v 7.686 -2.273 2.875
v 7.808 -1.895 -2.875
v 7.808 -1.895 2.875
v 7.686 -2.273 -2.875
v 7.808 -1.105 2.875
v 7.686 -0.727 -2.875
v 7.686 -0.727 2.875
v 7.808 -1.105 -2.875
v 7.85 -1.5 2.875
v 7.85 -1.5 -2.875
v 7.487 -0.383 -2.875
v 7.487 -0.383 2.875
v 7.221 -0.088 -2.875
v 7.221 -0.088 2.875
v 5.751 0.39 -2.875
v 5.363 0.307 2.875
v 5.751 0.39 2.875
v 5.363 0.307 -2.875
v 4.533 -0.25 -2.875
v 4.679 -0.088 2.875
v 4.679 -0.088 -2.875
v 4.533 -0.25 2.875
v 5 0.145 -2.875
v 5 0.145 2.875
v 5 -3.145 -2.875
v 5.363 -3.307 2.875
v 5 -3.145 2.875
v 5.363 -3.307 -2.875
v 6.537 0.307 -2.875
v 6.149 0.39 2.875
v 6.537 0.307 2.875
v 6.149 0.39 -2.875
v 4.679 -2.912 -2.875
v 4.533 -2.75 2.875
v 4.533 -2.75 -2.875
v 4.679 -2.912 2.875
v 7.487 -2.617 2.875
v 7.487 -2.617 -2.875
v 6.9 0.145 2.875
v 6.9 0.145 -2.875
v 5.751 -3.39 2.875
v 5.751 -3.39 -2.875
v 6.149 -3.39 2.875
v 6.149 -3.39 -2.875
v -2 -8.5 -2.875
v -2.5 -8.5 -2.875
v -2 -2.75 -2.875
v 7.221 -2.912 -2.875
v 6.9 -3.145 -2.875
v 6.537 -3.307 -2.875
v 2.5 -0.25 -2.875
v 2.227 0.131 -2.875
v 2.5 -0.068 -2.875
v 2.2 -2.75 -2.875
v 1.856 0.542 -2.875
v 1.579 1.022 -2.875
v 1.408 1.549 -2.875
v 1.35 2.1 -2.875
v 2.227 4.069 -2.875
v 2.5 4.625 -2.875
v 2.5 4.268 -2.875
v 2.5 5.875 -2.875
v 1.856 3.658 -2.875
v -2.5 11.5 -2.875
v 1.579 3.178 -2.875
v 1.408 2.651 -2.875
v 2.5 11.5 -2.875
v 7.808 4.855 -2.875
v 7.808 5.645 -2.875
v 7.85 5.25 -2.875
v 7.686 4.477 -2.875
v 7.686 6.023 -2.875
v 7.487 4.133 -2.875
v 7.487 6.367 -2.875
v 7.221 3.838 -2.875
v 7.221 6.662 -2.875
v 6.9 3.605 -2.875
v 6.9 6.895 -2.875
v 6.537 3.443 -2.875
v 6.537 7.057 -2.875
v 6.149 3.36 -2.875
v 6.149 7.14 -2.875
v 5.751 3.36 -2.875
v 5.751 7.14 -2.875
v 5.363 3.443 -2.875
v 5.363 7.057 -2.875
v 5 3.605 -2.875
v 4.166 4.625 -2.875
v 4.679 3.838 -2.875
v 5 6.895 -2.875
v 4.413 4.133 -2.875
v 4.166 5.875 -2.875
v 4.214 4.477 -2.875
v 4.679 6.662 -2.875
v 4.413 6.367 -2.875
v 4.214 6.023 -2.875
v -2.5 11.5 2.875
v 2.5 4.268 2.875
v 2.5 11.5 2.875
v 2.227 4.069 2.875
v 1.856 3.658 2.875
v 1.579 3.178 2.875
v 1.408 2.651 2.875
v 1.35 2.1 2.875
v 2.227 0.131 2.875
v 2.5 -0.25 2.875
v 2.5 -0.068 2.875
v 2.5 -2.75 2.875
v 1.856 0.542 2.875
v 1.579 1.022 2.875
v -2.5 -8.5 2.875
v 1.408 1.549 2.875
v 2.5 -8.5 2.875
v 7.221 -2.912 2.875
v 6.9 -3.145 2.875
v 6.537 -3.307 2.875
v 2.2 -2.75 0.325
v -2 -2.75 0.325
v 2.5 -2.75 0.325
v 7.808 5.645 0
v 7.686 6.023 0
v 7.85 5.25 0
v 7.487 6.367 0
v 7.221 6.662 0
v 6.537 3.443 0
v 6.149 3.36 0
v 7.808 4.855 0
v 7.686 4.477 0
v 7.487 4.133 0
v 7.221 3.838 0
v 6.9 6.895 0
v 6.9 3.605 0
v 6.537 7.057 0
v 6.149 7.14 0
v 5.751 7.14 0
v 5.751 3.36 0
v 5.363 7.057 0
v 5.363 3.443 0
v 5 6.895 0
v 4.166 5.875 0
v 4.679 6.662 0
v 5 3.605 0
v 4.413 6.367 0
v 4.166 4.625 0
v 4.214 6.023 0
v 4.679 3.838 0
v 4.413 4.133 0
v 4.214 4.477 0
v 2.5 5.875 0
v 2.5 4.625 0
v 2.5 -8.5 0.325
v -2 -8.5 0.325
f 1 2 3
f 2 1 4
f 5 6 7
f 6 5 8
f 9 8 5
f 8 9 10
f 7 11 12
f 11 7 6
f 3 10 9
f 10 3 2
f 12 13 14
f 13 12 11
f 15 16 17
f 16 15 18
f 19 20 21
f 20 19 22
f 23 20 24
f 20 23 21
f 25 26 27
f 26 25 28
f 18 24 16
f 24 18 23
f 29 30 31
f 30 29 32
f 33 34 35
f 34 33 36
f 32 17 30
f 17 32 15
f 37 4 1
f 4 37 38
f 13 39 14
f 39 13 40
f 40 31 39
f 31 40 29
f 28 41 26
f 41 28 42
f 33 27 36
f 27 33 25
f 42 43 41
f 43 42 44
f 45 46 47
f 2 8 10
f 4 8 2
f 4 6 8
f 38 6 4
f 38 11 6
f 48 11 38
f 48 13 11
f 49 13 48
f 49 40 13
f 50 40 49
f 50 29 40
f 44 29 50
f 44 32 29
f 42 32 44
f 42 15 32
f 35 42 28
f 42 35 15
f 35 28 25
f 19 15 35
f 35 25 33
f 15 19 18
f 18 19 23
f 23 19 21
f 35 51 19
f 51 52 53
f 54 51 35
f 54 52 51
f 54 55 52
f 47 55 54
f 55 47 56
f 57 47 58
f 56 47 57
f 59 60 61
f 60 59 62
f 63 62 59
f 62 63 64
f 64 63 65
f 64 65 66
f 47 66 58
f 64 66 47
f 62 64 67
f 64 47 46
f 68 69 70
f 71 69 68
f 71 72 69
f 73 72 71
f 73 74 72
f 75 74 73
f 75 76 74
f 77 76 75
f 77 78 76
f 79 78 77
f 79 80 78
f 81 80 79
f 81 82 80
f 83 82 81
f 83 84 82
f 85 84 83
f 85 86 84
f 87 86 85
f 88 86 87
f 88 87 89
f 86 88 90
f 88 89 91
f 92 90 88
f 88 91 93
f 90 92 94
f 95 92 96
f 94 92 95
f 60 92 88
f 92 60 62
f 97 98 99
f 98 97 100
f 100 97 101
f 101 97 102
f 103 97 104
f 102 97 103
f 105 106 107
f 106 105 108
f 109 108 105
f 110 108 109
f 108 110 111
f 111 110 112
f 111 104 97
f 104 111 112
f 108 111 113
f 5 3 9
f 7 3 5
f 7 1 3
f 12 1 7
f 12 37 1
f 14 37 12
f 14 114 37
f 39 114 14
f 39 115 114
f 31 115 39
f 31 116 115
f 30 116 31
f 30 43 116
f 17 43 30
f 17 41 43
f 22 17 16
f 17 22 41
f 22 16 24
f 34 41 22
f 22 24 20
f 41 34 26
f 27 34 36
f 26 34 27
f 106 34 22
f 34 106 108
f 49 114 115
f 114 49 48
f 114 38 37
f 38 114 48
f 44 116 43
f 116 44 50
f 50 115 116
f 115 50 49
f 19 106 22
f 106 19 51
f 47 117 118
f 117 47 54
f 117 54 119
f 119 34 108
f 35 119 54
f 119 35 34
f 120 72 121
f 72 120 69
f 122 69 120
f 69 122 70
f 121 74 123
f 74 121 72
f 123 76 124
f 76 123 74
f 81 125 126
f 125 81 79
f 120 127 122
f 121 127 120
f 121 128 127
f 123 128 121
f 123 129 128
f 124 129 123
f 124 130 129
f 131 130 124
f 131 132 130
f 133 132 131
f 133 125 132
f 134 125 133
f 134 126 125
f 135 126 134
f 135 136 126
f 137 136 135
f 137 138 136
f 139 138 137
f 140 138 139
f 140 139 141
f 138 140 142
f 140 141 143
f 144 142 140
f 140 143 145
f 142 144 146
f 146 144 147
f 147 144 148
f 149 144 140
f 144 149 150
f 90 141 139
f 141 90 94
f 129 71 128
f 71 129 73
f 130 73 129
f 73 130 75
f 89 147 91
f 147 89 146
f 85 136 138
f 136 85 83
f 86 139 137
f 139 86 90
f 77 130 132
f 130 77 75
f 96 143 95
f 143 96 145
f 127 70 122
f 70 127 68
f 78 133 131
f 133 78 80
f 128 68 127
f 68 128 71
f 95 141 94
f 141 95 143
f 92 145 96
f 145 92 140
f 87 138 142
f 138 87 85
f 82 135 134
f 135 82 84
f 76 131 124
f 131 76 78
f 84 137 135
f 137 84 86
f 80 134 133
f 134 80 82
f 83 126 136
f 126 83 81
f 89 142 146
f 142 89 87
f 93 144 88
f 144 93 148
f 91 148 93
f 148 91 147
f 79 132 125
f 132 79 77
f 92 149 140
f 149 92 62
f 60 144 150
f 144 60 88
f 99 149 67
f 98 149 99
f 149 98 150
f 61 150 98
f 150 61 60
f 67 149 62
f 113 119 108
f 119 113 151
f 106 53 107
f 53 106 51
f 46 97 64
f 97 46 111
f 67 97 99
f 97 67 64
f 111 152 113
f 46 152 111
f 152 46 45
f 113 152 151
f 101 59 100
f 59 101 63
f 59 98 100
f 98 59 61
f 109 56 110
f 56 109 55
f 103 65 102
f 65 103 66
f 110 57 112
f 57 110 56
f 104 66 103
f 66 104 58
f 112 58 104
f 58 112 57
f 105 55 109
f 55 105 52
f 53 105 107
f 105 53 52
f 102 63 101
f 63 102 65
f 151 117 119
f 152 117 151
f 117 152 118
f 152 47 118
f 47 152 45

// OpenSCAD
_fn=30;

_cxnPointCyl_radius=1.9;
_cxnPointCyl_leftOffset=1.5;
_cxnPointCyl_armLength=2.5;
_cxnPointCyl_armWidth=2.5;


_cxnPointHole_radius=2.65;
_cxnPointHole_gap=2.6;
_cxnPointHole_offset=0.6;

_cxnPointBase_width=9;
_cxnPointBase_offset=1.5;

_base_length=5;
_base_height=5.75;
_baseSub_height=3.2;
_base_tab_offset=20;

_side_height=15.75;
_side_width=8.5;

//_track_inner_width=54.5;
_track_inner_width=20;
_track_outer_width=72;



cxnPointWhole();


module cxnPointWhole()
{
    rotate([0,0,0])
    union(){
        cxnPointRight();
        //cxnPointBase();
        cxnPointLeft(); 
    }
    base();
}

module cxnPointRight()
{
    translate([_base_length/2 + _cxnPointCyl_armLength + _cxnPointCyl_radius/2 ,-_cxnPointCyl_leftOffset,0]) cylinder(r=_cxnPointCyl_radius, h=_base_height, center=true, $fn=_fn);
    
    translate([_base_length/2 + _cxnPointCyl_radius/2 , -_cxnPointCyl_leftOffset,0]) cube([ _cxnPointCyl_armLength, _cxnPointCyl_armWidth, _base_height], center=true);
    
}


module cxnPointLeft()
{
    translate([_base_length/2 + _cxnPointCyl_armLength + _cxnPointCyl_radius/2 ,_cxnPointHole_gap+_cxnPointHole_radius,-_base_height/4]) cylinder(r=_cxnPointCyl_radius, h=_base_height/2, center=true, $fn=_fn);
    
    translate([ _base_length/2 + _cxnPointCyl_radius/2 , _cxnPointHole_gap + _cxnPointHole_radius,-_base_height/4]) cube([_cxnPointCyl_armLength*2, _cxnPointCyl_armWidth/2, _base_height/2], center=true);
    
}


module cxnPointBase()
{
    difference(){
        translate([0,_cxnPointBase_offset,0]) cube([_base_length, _cxnPointBase_width, _base_height], center=true);
        
        translate([_cxnPointCyl_leftOffset + _base_length/2 , _cxnPointCyl_leftOffset +   _cxnPointHole_offset,0]) cylinder(r=_cxnPointHole_radius, h=_base_height+1, center=true, $fn=_fn);
    }
}

module base()
{
    difference(){
        translate([0,_cxnPointBase_offset,0]) cube([_base_length, _track_inner_width, _base_height], center=true);
        
        translate([_cxnPointCyl_leftOffset + _base_length/2 , _cxnPointCyl_leftOffset +   _cxnPointHole_offset,0]) cylinder(r=_cxnPointHole_radius, h=_base_height+1, center=true, $fn=_fn);
        
       translate([1,-_cxnPointCyl_leftOffset -_track_inner_width/2 -_cxnPointCyl_armWidth/2  , -(_base_height-_baseSub_height)/2-0.5]) cube([_base_length+1, _track_inner_width, _baseSub_height+1], center=true);    
    }
}

module cylArm()
{
    
}

module tabLeft()
{
    
}
